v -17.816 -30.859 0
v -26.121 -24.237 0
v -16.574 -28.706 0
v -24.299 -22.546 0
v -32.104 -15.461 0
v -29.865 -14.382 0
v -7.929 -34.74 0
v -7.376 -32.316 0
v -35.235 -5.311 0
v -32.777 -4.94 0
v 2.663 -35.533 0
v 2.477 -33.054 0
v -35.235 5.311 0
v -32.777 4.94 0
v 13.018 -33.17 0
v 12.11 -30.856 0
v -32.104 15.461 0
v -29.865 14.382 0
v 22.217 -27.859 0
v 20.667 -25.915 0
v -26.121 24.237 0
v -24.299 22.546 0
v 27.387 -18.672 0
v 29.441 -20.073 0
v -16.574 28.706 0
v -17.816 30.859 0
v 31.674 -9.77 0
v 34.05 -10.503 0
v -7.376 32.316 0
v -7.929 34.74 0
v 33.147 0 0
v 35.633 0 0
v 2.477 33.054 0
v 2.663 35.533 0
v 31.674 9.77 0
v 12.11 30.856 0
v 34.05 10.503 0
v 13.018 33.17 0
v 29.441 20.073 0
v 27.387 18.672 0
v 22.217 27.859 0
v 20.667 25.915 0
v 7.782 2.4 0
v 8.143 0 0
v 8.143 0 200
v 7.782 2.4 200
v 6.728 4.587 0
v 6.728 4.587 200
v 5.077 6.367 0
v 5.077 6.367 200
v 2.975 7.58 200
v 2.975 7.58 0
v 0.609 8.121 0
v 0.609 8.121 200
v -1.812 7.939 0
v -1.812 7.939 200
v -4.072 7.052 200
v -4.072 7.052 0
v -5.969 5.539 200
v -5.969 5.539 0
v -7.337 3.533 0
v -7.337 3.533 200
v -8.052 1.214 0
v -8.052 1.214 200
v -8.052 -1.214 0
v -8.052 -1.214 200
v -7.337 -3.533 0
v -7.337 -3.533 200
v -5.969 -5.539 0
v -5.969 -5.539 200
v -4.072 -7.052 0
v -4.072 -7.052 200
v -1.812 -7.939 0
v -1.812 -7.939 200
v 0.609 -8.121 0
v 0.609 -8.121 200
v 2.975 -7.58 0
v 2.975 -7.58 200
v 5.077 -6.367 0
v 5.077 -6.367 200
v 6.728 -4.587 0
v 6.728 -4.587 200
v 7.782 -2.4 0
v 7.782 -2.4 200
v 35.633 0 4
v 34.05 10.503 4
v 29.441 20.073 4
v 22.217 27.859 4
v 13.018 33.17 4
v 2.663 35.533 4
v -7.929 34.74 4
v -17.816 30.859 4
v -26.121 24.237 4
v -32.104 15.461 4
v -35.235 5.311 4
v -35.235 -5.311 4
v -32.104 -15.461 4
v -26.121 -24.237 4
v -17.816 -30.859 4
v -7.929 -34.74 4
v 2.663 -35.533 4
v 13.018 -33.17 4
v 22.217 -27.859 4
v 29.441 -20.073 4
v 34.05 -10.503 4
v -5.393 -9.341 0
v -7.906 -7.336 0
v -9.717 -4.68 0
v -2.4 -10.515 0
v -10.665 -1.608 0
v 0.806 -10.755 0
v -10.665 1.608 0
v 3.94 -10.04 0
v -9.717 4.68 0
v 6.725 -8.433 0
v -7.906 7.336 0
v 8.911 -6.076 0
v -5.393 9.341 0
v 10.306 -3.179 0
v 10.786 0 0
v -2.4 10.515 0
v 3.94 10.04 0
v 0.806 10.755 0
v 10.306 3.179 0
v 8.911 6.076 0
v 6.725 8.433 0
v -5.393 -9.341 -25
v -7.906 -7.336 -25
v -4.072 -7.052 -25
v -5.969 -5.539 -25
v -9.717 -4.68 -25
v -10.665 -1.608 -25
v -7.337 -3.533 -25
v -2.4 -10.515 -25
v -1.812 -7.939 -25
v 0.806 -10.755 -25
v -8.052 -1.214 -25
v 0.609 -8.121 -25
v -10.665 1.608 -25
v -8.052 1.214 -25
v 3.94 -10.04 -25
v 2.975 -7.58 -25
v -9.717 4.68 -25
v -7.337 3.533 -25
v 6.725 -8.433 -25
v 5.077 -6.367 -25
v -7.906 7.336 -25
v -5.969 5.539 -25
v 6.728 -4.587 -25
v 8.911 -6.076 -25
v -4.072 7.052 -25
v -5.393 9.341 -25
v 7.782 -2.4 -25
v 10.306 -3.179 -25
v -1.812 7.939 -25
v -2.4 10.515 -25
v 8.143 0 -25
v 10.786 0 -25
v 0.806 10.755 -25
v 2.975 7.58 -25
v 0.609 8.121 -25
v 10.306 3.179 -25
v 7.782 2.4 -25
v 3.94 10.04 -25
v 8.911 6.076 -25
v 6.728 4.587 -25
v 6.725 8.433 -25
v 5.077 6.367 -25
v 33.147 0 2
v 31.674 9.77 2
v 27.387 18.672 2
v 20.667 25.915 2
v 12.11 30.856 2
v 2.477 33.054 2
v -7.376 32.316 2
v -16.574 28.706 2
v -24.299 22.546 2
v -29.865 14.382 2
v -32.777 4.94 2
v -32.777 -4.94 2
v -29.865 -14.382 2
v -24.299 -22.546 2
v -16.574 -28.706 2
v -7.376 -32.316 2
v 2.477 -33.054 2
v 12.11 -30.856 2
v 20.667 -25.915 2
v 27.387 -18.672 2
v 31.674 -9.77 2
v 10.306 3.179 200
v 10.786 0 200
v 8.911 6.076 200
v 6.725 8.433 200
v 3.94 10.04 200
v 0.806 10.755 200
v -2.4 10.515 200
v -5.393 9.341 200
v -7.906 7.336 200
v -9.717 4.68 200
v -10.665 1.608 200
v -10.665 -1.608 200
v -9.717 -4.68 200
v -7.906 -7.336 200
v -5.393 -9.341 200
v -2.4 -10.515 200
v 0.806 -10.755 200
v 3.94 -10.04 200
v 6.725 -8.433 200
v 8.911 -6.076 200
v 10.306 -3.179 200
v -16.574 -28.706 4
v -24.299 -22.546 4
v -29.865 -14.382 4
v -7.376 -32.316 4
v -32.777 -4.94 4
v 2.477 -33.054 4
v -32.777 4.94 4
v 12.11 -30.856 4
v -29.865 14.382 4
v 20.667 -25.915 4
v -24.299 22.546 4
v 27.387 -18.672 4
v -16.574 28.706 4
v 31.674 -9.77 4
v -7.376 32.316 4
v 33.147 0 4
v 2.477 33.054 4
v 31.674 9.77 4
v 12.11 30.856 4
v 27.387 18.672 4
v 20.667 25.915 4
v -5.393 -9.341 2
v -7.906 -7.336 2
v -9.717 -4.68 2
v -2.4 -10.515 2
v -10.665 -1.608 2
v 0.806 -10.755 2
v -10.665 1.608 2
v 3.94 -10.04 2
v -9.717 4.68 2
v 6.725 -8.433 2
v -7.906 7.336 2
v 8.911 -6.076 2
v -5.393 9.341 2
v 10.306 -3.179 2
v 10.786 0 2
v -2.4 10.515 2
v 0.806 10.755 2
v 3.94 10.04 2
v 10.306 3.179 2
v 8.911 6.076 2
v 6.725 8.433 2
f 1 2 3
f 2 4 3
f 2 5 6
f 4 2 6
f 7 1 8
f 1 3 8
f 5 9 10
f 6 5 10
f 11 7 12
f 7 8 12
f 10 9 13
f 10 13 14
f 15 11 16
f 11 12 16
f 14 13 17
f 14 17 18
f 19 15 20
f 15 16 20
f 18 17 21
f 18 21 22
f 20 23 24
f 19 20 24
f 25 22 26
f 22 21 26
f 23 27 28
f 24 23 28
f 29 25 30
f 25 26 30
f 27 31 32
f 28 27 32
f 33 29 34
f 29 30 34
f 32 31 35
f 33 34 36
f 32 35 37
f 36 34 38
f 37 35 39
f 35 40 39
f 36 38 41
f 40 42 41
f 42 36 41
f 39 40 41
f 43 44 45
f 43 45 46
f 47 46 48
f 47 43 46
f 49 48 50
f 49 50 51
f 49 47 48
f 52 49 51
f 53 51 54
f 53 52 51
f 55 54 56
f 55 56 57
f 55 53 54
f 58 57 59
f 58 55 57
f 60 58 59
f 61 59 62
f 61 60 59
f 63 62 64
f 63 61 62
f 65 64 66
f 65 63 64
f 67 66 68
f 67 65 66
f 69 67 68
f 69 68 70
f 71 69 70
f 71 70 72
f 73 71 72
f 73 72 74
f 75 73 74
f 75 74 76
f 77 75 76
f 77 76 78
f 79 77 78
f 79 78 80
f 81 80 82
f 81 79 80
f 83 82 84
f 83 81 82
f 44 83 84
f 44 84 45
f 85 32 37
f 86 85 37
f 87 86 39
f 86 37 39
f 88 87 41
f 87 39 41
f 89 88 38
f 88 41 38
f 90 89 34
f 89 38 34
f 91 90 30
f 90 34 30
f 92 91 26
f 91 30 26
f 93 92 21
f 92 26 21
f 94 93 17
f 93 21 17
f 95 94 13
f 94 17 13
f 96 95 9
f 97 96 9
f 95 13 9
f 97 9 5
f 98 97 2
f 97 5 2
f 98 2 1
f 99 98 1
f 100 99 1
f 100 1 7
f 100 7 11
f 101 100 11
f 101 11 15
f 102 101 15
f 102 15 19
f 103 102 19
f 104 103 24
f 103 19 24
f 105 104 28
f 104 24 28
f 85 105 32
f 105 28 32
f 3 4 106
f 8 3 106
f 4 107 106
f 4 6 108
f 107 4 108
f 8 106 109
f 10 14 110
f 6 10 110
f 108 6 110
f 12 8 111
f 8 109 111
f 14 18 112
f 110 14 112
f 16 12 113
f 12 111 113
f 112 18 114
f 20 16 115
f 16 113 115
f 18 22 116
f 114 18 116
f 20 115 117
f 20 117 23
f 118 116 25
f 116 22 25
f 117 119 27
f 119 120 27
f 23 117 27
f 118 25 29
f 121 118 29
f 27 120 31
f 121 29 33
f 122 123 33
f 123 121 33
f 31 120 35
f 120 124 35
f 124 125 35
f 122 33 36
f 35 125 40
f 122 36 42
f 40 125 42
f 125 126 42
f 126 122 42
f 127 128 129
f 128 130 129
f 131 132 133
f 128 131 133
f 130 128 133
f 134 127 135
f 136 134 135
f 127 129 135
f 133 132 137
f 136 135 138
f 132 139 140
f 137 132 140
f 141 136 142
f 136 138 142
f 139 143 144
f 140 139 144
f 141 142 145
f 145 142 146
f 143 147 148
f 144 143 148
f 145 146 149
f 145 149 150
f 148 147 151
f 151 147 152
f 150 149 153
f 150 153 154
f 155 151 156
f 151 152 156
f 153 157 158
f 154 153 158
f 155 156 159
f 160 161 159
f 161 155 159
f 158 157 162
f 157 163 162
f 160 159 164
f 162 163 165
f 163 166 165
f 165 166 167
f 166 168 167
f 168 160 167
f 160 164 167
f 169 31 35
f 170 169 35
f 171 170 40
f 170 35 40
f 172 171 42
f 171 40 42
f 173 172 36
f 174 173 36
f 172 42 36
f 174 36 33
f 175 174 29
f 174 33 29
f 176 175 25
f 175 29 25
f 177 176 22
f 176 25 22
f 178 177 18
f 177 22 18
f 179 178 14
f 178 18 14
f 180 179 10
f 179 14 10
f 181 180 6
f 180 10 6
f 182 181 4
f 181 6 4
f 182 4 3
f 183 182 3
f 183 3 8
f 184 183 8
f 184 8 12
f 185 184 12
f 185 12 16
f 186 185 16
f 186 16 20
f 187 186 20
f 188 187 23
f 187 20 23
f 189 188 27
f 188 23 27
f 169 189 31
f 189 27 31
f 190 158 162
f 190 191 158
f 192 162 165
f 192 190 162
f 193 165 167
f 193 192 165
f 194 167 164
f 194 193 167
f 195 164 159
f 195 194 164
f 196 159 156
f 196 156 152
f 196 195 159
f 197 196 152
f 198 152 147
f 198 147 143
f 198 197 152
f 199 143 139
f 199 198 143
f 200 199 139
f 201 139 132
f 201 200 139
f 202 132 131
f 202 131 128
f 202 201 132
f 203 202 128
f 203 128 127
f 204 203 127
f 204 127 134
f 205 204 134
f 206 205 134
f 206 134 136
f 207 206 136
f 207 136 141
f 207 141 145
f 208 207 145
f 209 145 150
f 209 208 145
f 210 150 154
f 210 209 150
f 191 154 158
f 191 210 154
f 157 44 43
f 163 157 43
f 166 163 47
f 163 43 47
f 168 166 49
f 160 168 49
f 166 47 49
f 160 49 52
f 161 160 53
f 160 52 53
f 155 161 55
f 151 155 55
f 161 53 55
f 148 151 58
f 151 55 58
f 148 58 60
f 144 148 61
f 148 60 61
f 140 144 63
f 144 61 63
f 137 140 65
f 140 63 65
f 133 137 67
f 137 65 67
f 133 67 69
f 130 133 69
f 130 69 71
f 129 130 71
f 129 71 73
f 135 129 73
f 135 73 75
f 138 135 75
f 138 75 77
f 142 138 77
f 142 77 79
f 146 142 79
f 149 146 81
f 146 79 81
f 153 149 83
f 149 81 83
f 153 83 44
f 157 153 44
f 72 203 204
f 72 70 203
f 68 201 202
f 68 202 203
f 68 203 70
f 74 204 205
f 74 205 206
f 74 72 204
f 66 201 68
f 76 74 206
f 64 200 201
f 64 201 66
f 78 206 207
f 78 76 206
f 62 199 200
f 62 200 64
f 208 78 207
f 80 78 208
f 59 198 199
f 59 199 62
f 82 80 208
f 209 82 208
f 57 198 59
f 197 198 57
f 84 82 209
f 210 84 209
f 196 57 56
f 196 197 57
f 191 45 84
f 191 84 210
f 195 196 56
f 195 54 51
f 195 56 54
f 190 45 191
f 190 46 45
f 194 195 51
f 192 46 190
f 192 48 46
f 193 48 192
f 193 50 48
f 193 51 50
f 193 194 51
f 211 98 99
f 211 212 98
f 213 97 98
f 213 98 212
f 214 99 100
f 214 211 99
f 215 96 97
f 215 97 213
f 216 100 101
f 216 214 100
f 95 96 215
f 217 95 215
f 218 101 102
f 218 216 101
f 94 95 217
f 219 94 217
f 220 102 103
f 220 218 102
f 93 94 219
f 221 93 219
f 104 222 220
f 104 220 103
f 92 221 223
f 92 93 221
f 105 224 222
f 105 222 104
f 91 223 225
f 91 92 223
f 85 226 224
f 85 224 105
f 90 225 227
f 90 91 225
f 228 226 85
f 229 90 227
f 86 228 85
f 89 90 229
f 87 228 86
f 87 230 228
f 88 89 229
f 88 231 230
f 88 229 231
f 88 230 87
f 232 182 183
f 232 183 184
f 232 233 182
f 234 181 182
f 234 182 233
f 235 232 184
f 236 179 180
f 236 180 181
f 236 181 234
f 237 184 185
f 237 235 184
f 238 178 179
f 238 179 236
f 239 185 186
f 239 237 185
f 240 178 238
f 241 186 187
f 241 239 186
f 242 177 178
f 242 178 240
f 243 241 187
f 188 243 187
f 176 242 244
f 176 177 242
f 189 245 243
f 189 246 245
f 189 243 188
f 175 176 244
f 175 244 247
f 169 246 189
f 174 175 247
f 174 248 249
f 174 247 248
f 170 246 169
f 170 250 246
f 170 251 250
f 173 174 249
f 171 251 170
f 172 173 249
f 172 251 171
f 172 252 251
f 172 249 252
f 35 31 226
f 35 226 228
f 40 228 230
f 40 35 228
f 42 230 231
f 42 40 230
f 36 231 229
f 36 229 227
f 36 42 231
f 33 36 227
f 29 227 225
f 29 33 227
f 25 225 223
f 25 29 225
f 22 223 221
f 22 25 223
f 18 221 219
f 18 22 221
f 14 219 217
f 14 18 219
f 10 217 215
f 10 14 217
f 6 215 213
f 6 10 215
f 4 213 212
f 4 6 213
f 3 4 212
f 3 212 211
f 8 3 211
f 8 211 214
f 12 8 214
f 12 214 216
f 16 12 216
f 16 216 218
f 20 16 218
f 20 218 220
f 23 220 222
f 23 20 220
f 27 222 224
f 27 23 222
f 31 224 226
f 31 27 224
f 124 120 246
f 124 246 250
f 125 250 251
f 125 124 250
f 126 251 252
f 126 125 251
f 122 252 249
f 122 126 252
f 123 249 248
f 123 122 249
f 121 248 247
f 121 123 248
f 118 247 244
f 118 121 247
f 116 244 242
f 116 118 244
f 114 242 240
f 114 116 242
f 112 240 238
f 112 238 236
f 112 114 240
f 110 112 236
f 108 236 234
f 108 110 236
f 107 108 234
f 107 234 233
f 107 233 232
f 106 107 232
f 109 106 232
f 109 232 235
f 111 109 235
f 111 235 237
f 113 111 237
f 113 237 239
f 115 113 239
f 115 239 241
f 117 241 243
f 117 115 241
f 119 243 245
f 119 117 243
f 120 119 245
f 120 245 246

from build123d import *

# Parameters (mm, degrees)
F0_R          = 35.632987
F0_R_2        = 33.147114
F1_DEPTH      = 4
F0_R_3        = 10.785597
F0_R_4        = 8.143349
F2_DEPTH      = 200
F2_DEPTH_BACK = 25
F3_DEPTH      = 2


with BuildPart() as f1:
    # F0 (on Top) → F1 (new body)
    with BuildSketch(Plane.XY):
        Circle(F0_R)
        Circle(F0_R_2, mode=Mode.SUBTRACT)
    extrude(amount=F1_DEPTH)


with BuildPart() as f2:
    # F0 (on Top) → F2 (new body, two sides)
    with BuildSketch(Plane.XY) as f2_sk:
        Circle(F0_R_3)
        Circle(F0_R_4, mode=Mode.SUBTRACT)
    extrude(amount=F2_DEPTH)
    extrude(f2_sk.sketch, amount=-F2_DEPTH_BACK)


with BuildPart() as f3:
    # F0 (on Top) → F3 (new body)
    with BuildSketch(Plane.XY):
        Circle(F0_R_2)
        Circle(F0_R_3, mode=Mode.SUBTRACT)
    extrude(amount=F3_DEPTH)


solid = Compound([f1.part, f2.part, f3.part])
